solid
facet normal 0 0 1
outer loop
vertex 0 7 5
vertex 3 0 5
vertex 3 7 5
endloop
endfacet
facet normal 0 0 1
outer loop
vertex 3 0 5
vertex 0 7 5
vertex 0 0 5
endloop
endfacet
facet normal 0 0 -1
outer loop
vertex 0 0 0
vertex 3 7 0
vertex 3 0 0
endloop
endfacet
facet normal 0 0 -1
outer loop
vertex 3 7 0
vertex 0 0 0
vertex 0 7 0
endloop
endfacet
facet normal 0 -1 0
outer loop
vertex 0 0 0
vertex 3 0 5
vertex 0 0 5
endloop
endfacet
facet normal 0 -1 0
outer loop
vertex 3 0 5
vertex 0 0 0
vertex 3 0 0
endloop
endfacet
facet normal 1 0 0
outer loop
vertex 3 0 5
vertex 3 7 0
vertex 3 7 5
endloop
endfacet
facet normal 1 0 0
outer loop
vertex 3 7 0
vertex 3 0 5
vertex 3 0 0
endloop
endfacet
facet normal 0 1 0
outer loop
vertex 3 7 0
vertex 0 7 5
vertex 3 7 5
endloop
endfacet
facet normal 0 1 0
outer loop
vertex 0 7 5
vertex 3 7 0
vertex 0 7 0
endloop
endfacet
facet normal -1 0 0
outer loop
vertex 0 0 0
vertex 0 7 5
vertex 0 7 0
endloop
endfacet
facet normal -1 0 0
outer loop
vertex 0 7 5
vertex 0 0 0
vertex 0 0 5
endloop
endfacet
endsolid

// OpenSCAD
// Generated by SolidPython 1.0.1 on 2020-07-29 00:46:54


cube(size = [3, 7, 5]);
/***********************************************
*********      SolidPython code:      **********
************************************************
 
# import packages: SolidPython
from solid import *
from solid.utils import *
from itertools import chain, combinations, permutations


class Resize:

    def __init__(self, scad_file):
        self.scad_file = scad_file
        #self.scad_file = import_scad(scad_file)
        # cone/cylinder param:
        self.r1 = 0
        self.r2 = 0
        self.h = 0
        # rectangular prism param:
        self.w = 0
        self.l = 0
        # ellipse param:
        self.r = 0

    # import OpenScad code (file name corresponds to shape)


    # classify shape + parameters
    def assign(self, param1, param2, param3):
        if self.scad_file == 'cone.scad':
            self.r1 = param1
            self.r2 = param2
            self.h = param3
        elif self.scad_file == 'cylinder.scad':
            self.r1 = param1
            self.r2 = param2
            self.h = param3
        elif self.scad_file == 'rectangularPrism.scad':
            self.h = param1
            self.l = param2
            self.w = param3
        else:
            self.r = param1
            self.h = param2

    # resize parameters
    def iterate(self):
        x = range(3, 20, 2)
        i = 1
        if self.scad_file == 'cone.scad':
            tempList = list(permutations(x, 2))
            for temp in tempList:
                param1 = temp[0]
                param2 = temp[1]
                filepath = 'produced_scad_files/' + 'cone' + str(param1) + '_' + str(param2) + '_' + '.scad'
                scad_render_to_file(cylinder(h=param1, r1=param2, r2=0), filepath)

        elif self.scad_file == 'cylinder.scad':
            tempList = list(permutations(x, 3))
            for temp in tempList:
                param1 = temp[0]
                param2 = temp[1]
                filepath = 'produced_scad_files/' + 'cylinder' + str(param1) + '_' + str(param2) + '_' + '.scad'
                scad_render_to_file(cylinder(h=param1, r1=param2, r2=param2), filepath)

        elif self.scad_file == 'rectangularPrism.scad':
            tempList = list(permutations(x, 3))
            for temp in tempList:
                param1 = temp[0]
                param2 = temp[1]
                param3 = temp[2]
                filepath = 'produced_scad_files/' + 'rectangularPrism' + str(param1) + '_' + str(param2) + '_' + str(
                    param3) + '.scad'
                scad_render_to_file(cube(size=(param1, param2, param3)), filepath)

        elif self.scad_file == 'ellipse.scad':
            tempList = list(permutations(x, 4))
            for temp in tempList:
                param1 = temp[0]
                param2 = temp[1]
                param3 = temp[2]
                param4 = temp[3]
                filepath = 'produced_scad_files/' + 'ellipse' + str(param1) + '_' + str(param2) + '_' + str(param3) + '_' + str(param4) + '.scad'
                scad_render_to_file(scale([param1, param2, param3])(sphere(r=param4)), filepath)

    def render_to_scadfile(self):
        scad_render_to_file(scad, 'example.scad') 
 
************************************************/
